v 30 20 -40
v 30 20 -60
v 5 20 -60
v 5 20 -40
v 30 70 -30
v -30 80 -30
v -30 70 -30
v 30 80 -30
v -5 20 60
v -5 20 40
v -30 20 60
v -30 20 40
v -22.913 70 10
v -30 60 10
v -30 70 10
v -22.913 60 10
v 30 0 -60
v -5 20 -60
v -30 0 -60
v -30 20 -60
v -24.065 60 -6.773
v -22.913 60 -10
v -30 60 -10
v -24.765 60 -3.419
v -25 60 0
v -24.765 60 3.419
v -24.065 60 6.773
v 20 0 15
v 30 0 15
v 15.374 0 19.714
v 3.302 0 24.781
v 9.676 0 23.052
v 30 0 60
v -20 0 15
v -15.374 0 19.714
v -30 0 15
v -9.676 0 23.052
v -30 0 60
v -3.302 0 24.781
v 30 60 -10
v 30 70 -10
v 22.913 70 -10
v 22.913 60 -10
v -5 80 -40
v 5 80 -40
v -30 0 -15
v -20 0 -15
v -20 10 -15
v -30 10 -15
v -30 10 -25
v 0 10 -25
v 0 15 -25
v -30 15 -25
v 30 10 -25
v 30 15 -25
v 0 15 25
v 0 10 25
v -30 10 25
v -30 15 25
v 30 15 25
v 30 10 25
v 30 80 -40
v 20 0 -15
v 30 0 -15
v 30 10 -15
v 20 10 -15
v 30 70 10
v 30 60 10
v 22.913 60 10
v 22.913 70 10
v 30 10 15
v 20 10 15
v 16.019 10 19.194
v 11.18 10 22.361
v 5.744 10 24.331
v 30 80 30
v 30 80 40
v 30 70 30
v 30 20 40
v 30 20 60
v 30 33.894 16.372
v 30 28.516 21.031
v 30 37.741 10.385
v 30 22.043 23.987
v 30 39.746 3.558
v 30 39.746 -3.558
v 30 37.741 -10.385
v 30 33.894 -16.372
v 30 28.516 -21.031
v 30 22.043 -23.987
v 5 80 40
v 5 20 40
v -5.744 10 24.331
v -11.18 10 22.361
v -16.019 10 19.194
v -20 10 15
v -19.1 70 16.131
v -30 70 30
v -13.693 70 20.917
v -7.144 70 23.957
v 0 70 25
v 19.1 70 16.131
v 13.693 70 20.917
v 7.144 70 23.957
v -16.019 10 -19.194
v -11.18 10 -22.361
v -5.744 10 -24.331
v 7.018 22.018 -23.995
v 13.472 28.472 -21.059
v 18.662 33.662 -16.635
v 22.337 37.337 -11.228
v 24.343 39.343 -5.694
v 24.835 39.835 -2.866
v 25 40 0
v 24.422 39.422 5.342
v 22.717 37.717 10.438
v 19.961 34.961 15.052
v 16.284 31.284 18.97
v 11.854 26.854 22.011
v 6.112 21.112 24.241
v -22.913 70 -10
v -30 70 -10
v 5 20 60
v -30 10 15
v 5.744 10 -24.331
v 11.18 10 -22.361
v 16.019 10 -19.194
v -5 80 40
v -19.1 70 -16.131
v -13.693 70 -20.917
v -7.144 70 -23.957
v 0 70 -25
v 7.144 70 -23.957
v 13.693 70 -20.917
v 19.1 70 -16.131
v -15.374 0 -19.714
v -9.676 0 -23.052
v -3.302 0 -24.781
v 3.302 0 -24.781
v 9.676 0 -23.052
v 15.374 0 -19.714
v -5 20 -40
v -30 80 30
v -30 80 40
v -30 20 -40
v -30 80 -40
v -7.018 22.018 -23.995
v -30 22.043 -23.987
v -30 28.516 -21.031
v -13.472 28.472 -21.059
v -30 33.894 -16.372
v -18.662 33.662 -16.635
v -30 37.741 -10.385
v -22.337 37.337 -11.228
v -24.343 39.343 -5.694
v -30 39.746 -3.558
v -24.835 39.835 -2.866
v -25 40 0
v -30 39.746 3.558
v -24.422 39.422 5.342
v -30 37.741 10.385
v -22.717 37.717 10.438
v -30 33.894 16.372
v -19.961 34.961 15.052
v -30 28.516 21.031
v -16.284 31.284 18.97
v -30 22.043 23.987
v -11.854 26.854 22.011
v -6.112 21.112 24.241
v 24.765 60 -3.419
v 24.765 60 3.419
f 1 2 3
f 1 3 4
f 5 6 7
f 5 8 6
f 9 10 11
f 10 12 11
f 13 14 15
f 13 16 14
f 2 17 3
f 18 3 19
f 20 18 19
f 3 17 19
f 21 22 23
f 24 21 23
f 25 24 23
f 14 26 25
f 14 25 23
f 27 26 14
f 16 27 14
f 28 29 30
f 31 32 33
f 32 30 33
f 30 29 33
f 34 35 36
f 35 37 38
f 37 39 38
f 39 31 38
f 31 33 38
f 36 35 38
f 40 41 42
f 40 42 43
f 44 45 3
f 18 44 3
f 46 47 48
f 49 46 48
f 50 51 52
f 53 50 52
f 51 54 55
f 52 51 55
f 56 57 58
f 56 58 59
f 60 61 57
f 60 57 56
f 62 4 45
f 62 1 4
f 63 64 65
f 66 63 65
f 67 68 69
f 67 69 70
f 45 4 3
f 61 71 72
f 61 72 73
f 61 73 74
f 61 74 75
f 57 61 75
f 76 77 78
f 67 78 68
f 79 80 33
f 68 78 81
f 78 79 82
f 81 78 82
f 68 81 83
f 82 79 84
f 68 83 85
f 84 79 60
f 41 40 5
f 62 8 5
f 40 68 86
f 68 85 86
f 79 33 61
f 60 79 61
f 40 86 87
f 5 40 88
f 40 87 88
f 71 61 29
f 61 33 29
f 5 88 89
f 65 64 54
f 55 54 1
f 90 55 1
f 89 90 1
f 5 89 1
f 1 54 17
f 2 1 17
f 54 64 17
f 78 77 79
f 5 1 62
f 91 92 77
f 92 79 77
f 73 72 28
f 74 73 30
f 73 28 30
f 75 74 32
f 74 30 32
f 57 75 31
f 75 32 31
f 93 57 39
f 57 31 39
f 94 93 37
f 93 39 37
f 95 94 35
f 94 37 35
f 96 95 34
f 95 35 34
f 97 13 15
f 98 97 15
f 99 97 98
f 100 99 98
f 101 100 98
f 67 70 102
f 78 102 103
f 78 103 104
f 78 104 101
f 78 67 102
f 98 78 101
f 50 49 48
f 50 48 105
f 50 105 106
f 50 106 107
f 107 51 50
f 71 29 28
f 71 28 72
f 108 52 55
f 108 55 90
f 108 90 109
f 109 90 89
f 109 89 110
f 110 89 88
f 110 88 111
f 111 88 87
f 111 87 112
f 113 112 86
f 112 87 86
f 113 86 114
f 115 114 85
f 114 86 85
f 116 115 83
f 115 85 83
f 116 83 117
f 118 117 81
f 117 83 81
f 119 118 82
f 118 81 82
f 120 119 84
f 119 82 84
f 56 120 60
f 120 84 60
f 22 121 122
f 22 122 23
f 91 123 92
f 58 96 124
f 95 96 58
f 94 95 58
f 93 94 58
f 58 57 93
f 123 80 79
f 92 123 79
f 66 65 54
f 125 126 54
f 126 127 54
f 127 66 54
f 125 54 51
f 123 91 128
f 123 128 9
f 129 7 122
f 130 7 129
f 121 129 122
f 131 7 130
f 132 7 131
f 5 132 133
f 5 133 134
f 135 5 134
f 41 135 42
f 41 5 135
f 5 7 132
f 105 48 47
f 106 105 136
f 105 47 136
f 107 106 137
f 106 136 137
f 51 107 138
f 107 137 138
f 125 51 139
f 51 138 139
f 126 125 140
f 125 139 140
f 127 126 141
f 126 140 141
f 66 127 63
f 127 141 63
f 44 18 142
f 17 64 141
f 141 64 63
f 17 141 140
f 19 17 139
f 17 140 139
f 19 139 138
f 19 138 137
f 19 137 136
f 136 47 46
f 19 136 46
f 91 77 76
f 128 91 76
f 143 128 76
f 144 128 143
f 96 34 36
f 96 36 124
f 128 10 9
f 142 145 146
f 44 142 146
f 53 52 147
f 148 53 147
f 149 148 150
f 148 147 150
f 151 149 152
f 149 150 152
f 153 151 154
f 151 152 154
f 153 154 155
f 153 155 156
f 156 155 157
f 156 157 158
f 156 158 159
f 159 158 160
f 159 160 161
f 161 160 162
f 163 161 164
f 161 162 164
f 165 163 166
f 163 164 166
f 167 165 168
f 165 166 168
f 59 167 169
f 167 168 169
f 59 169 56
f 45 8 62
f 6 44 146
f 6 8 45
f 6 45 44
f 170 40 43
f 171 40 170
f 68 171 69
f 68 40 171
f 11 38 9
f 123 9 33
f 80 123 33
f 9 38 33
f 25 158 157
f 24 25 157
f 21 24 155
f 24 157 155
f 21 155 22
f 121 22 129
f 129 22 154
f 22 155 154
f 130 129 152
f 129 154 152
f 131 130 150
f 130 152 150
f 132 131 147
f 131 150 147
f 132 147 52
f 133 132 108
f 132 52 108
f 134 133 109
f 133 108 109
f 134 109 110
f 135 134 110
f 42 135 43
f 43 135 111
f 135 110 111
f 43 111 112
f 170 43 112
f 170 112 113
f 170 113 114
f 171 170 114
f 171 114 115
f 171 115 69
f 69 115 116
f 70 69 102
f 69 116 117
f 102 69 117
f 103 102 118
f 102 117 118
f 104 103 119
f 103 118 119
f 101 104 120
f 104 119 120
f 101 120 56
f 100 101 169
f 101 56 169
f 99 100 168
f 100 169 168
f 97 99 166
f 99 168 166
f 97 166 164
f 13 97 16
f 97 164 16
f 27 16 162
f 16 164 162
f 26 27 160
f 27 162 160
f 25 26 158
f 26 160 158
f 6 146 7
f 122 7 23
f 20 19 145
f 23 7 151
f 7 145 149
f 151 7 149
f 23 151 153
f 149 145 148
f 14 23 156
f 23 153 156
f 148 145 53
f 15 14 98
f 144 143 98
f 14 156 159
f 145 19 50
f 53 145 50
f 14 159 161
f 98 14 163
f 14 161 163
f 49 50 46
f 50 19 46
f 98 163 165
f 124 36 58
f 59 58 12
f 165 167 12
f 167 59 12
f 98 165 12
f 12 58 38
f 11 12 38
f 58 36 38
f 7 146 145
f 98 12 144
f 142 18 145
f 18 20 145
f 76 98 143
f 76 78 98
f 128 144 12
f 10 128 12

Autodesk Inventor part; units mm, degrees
ref_plane "YZ Plane" through (0, 0, 0) normal (1, 0, 0) x (0, 1, 0)
ref_plane "XZ Plane" through (0, 0, 0) normal (0, 1, 0) x (-1, 0, 0)
ref_plane "XY Plane" through (0, 0, 0) normal (0, 0, 1) x (1, 0, 0)
sketch "Эскиз1" plane through (0, 0, 0) normal (0, 1, 0) x (-1, 0, 0)
  line L0 (30, 60) -> (-30, 60)
  line L1 (-30, 60) -> (-30, -60)
  line L2 (-30, -60) -> (30, -60)
  line L3 (30, -60) -> (30, 60)
  point P0 (0, 0)
  dimension "d0" = 60
  dimension "d1" = 120
extrude "Выдавливание1" add sketch "Эскиз1" along normal blind 80
sketch "Эскиз2" plane through (0, 0, 0) normal (1, 0, 0) x (0, 1, 0)
  line L0 (80, 60) -> (80, -60) projected
  line L1 (80, -30) -> (70, -30)
  line L2 (80, -30) -> (90, -30) construction
  line L3 (70, -30) -> (70, -10)
  line L4 (70, -10) -> (60, -10)
  line L5 (60, -10) -> (60, 10)
  line L6 (60, 10) -> (70, 10)
  line L7 (70, 10) -> (70, 30)
  line L8 (70, 30) -> (80, 30)
extrude "Выдавливание2" cut sketch "Эскиз2" against normal mid plane 80
sketch "Эскиз3" plane through (0, 0, 0) normal (1, 0, 0) x (0, 1, 0)
  line L0 (0, 60) -> (0, -60) projected
  line L1 (0, -15) -> (10, -15)
  line L2 (0, -15) -> (10, -15) construction
  line L3 (10, -15) -> (10, -25)
  line L4 (10, -25) -> (15, -25)
  line L5 (0, -15) -> (0, 15)
  line L6 (0, 15) -> (10, 15)
  line L7 (10, 15) -> (10, 25)
  line L8 (10, 25) -> (15, 25)
  arc A0 (15, -25) -> (15, 25) centre (15, 0) ccw
  point P0 (0, 0)
  dimension "d20" = 10
  dimension "d21" = 0
  dimension "d22" = 30
extrude "Выдавливание3" cut sketch "Эскиз3" against normal mid plane 80
sketch "Эскиз4" plane through (0, 0, 0) normal (0, 1, 0) x (-1, 0, 0)
  circle A0 centre (0, 0) radius 25
  dimension "d25" = 50
extrude "Выдавливание4" cut sketch "Эскиз4" along normal blind 80
sketch "Эскиз5" plane through (30, 0, -60) normal (1, 0, 0) x (0, 0, -1)
  line L0 (-120, 0) -> (-120, 80) projected
  line L1 (-120, 20) -> (-100, 20)
  line L2 (-120, 20) -> (-100, 20) construction
  line L3 (-100, 20) -> (-100, 80)
  line L4 (-120, 80) -> (-90, 80) projected
  line L5 (0, 0) -> (0, 80) projected
  line L6 (0, 20) -> (-20, 20)
  line L7 (0, 20) -> (20, 20) construction
  line L8 (-20, 20) -> (-20, 80)
  line L9 (0, 80) -> (-30, 80) projected
  point P0 (-60, 0)
  dimension "d28" = 20
  dimension "d29" = 0
  dimension "d30" = 20
  dimension "d31" = 180
extrude "Выдавливание5" cut sketch "Эскиз5" against normal blind 25
sketch "Эскиз6" plane through (-30, 0, 60) normal (-1, 0, 0) x (0, 0, 1)
  line L0 (-120, 0) -> (-120, 80) projected
  line L1 (-120, 20) -> (-100, 20) projected
  line L2 (-120, 20) -> (-100, 20)
  line L3 (-100, 20) -> (-100, 80)
  line L4 (-120, 80) -> (-90, 80) projected
  line L5 (-20, 20) -> (0, 20) projected
  line L6 (0, 20) -> (-20, 20)
  line L7 (-20, 80) -> (-20, 20) projected
  line L8 (-20, 20) -> (-20, 80)
  line L9 (-20, 80) -> (-30, 80) projected
  line L10 (-30, 80) -> (0, 80) projected
  line L11 (-20, 80) -> (0, 80)
  line L12 (0, 20) -> (0, 80) projected
  line L13 (0, 80) -> (0, 20)
  point P0 (-60, 0)
extrude "Выдавливание6" cut sketch "Эскиз6" against normal blind 25
sketch "Эскиз7" plane through (5, 0, -60) normal (1, 0, 0) x (0, 0, -1)
  line L0 (-20, 80) -> (-20, 20) projected
  line L1 (-20, 20) -> (0, 20) projected
  line L2 (-20, 80) -> (0, 20)
  line L3 (0, 20) -> (-20, 20)
  line L4 (0, 80) -> (-20, 80) projected
  line L5 (-20, 20) -> (-20, 80)
  line L6 (0, 20) -> (0, 80) projected
  line L7 (0, 80) -> (0, 20)
  point P0 (-60, 0)
extrude "Выдавливание7" cut sketch "Эскиз7" against normal blind 25 contours L4 L6 L2
sketch "Эскиз8" plane through (5, 0, -60) normal (1, 0, 0) x (0, 0, -1)
  line L0 (-120, 20) -> (-120, 80) projected
  line L1 (-100, 80) -> (-120, 20)
  line L2 (-120, 20) -> (-120, 80)
  line L3 (-120, 80) -> (-100, 80) projected
  line L4 (-120, 80) -> (-100, 80)
  point P0 (-60, 0)
extrude "Выдавливание8" cut sketch "Эскиз8" against normal blind 25
